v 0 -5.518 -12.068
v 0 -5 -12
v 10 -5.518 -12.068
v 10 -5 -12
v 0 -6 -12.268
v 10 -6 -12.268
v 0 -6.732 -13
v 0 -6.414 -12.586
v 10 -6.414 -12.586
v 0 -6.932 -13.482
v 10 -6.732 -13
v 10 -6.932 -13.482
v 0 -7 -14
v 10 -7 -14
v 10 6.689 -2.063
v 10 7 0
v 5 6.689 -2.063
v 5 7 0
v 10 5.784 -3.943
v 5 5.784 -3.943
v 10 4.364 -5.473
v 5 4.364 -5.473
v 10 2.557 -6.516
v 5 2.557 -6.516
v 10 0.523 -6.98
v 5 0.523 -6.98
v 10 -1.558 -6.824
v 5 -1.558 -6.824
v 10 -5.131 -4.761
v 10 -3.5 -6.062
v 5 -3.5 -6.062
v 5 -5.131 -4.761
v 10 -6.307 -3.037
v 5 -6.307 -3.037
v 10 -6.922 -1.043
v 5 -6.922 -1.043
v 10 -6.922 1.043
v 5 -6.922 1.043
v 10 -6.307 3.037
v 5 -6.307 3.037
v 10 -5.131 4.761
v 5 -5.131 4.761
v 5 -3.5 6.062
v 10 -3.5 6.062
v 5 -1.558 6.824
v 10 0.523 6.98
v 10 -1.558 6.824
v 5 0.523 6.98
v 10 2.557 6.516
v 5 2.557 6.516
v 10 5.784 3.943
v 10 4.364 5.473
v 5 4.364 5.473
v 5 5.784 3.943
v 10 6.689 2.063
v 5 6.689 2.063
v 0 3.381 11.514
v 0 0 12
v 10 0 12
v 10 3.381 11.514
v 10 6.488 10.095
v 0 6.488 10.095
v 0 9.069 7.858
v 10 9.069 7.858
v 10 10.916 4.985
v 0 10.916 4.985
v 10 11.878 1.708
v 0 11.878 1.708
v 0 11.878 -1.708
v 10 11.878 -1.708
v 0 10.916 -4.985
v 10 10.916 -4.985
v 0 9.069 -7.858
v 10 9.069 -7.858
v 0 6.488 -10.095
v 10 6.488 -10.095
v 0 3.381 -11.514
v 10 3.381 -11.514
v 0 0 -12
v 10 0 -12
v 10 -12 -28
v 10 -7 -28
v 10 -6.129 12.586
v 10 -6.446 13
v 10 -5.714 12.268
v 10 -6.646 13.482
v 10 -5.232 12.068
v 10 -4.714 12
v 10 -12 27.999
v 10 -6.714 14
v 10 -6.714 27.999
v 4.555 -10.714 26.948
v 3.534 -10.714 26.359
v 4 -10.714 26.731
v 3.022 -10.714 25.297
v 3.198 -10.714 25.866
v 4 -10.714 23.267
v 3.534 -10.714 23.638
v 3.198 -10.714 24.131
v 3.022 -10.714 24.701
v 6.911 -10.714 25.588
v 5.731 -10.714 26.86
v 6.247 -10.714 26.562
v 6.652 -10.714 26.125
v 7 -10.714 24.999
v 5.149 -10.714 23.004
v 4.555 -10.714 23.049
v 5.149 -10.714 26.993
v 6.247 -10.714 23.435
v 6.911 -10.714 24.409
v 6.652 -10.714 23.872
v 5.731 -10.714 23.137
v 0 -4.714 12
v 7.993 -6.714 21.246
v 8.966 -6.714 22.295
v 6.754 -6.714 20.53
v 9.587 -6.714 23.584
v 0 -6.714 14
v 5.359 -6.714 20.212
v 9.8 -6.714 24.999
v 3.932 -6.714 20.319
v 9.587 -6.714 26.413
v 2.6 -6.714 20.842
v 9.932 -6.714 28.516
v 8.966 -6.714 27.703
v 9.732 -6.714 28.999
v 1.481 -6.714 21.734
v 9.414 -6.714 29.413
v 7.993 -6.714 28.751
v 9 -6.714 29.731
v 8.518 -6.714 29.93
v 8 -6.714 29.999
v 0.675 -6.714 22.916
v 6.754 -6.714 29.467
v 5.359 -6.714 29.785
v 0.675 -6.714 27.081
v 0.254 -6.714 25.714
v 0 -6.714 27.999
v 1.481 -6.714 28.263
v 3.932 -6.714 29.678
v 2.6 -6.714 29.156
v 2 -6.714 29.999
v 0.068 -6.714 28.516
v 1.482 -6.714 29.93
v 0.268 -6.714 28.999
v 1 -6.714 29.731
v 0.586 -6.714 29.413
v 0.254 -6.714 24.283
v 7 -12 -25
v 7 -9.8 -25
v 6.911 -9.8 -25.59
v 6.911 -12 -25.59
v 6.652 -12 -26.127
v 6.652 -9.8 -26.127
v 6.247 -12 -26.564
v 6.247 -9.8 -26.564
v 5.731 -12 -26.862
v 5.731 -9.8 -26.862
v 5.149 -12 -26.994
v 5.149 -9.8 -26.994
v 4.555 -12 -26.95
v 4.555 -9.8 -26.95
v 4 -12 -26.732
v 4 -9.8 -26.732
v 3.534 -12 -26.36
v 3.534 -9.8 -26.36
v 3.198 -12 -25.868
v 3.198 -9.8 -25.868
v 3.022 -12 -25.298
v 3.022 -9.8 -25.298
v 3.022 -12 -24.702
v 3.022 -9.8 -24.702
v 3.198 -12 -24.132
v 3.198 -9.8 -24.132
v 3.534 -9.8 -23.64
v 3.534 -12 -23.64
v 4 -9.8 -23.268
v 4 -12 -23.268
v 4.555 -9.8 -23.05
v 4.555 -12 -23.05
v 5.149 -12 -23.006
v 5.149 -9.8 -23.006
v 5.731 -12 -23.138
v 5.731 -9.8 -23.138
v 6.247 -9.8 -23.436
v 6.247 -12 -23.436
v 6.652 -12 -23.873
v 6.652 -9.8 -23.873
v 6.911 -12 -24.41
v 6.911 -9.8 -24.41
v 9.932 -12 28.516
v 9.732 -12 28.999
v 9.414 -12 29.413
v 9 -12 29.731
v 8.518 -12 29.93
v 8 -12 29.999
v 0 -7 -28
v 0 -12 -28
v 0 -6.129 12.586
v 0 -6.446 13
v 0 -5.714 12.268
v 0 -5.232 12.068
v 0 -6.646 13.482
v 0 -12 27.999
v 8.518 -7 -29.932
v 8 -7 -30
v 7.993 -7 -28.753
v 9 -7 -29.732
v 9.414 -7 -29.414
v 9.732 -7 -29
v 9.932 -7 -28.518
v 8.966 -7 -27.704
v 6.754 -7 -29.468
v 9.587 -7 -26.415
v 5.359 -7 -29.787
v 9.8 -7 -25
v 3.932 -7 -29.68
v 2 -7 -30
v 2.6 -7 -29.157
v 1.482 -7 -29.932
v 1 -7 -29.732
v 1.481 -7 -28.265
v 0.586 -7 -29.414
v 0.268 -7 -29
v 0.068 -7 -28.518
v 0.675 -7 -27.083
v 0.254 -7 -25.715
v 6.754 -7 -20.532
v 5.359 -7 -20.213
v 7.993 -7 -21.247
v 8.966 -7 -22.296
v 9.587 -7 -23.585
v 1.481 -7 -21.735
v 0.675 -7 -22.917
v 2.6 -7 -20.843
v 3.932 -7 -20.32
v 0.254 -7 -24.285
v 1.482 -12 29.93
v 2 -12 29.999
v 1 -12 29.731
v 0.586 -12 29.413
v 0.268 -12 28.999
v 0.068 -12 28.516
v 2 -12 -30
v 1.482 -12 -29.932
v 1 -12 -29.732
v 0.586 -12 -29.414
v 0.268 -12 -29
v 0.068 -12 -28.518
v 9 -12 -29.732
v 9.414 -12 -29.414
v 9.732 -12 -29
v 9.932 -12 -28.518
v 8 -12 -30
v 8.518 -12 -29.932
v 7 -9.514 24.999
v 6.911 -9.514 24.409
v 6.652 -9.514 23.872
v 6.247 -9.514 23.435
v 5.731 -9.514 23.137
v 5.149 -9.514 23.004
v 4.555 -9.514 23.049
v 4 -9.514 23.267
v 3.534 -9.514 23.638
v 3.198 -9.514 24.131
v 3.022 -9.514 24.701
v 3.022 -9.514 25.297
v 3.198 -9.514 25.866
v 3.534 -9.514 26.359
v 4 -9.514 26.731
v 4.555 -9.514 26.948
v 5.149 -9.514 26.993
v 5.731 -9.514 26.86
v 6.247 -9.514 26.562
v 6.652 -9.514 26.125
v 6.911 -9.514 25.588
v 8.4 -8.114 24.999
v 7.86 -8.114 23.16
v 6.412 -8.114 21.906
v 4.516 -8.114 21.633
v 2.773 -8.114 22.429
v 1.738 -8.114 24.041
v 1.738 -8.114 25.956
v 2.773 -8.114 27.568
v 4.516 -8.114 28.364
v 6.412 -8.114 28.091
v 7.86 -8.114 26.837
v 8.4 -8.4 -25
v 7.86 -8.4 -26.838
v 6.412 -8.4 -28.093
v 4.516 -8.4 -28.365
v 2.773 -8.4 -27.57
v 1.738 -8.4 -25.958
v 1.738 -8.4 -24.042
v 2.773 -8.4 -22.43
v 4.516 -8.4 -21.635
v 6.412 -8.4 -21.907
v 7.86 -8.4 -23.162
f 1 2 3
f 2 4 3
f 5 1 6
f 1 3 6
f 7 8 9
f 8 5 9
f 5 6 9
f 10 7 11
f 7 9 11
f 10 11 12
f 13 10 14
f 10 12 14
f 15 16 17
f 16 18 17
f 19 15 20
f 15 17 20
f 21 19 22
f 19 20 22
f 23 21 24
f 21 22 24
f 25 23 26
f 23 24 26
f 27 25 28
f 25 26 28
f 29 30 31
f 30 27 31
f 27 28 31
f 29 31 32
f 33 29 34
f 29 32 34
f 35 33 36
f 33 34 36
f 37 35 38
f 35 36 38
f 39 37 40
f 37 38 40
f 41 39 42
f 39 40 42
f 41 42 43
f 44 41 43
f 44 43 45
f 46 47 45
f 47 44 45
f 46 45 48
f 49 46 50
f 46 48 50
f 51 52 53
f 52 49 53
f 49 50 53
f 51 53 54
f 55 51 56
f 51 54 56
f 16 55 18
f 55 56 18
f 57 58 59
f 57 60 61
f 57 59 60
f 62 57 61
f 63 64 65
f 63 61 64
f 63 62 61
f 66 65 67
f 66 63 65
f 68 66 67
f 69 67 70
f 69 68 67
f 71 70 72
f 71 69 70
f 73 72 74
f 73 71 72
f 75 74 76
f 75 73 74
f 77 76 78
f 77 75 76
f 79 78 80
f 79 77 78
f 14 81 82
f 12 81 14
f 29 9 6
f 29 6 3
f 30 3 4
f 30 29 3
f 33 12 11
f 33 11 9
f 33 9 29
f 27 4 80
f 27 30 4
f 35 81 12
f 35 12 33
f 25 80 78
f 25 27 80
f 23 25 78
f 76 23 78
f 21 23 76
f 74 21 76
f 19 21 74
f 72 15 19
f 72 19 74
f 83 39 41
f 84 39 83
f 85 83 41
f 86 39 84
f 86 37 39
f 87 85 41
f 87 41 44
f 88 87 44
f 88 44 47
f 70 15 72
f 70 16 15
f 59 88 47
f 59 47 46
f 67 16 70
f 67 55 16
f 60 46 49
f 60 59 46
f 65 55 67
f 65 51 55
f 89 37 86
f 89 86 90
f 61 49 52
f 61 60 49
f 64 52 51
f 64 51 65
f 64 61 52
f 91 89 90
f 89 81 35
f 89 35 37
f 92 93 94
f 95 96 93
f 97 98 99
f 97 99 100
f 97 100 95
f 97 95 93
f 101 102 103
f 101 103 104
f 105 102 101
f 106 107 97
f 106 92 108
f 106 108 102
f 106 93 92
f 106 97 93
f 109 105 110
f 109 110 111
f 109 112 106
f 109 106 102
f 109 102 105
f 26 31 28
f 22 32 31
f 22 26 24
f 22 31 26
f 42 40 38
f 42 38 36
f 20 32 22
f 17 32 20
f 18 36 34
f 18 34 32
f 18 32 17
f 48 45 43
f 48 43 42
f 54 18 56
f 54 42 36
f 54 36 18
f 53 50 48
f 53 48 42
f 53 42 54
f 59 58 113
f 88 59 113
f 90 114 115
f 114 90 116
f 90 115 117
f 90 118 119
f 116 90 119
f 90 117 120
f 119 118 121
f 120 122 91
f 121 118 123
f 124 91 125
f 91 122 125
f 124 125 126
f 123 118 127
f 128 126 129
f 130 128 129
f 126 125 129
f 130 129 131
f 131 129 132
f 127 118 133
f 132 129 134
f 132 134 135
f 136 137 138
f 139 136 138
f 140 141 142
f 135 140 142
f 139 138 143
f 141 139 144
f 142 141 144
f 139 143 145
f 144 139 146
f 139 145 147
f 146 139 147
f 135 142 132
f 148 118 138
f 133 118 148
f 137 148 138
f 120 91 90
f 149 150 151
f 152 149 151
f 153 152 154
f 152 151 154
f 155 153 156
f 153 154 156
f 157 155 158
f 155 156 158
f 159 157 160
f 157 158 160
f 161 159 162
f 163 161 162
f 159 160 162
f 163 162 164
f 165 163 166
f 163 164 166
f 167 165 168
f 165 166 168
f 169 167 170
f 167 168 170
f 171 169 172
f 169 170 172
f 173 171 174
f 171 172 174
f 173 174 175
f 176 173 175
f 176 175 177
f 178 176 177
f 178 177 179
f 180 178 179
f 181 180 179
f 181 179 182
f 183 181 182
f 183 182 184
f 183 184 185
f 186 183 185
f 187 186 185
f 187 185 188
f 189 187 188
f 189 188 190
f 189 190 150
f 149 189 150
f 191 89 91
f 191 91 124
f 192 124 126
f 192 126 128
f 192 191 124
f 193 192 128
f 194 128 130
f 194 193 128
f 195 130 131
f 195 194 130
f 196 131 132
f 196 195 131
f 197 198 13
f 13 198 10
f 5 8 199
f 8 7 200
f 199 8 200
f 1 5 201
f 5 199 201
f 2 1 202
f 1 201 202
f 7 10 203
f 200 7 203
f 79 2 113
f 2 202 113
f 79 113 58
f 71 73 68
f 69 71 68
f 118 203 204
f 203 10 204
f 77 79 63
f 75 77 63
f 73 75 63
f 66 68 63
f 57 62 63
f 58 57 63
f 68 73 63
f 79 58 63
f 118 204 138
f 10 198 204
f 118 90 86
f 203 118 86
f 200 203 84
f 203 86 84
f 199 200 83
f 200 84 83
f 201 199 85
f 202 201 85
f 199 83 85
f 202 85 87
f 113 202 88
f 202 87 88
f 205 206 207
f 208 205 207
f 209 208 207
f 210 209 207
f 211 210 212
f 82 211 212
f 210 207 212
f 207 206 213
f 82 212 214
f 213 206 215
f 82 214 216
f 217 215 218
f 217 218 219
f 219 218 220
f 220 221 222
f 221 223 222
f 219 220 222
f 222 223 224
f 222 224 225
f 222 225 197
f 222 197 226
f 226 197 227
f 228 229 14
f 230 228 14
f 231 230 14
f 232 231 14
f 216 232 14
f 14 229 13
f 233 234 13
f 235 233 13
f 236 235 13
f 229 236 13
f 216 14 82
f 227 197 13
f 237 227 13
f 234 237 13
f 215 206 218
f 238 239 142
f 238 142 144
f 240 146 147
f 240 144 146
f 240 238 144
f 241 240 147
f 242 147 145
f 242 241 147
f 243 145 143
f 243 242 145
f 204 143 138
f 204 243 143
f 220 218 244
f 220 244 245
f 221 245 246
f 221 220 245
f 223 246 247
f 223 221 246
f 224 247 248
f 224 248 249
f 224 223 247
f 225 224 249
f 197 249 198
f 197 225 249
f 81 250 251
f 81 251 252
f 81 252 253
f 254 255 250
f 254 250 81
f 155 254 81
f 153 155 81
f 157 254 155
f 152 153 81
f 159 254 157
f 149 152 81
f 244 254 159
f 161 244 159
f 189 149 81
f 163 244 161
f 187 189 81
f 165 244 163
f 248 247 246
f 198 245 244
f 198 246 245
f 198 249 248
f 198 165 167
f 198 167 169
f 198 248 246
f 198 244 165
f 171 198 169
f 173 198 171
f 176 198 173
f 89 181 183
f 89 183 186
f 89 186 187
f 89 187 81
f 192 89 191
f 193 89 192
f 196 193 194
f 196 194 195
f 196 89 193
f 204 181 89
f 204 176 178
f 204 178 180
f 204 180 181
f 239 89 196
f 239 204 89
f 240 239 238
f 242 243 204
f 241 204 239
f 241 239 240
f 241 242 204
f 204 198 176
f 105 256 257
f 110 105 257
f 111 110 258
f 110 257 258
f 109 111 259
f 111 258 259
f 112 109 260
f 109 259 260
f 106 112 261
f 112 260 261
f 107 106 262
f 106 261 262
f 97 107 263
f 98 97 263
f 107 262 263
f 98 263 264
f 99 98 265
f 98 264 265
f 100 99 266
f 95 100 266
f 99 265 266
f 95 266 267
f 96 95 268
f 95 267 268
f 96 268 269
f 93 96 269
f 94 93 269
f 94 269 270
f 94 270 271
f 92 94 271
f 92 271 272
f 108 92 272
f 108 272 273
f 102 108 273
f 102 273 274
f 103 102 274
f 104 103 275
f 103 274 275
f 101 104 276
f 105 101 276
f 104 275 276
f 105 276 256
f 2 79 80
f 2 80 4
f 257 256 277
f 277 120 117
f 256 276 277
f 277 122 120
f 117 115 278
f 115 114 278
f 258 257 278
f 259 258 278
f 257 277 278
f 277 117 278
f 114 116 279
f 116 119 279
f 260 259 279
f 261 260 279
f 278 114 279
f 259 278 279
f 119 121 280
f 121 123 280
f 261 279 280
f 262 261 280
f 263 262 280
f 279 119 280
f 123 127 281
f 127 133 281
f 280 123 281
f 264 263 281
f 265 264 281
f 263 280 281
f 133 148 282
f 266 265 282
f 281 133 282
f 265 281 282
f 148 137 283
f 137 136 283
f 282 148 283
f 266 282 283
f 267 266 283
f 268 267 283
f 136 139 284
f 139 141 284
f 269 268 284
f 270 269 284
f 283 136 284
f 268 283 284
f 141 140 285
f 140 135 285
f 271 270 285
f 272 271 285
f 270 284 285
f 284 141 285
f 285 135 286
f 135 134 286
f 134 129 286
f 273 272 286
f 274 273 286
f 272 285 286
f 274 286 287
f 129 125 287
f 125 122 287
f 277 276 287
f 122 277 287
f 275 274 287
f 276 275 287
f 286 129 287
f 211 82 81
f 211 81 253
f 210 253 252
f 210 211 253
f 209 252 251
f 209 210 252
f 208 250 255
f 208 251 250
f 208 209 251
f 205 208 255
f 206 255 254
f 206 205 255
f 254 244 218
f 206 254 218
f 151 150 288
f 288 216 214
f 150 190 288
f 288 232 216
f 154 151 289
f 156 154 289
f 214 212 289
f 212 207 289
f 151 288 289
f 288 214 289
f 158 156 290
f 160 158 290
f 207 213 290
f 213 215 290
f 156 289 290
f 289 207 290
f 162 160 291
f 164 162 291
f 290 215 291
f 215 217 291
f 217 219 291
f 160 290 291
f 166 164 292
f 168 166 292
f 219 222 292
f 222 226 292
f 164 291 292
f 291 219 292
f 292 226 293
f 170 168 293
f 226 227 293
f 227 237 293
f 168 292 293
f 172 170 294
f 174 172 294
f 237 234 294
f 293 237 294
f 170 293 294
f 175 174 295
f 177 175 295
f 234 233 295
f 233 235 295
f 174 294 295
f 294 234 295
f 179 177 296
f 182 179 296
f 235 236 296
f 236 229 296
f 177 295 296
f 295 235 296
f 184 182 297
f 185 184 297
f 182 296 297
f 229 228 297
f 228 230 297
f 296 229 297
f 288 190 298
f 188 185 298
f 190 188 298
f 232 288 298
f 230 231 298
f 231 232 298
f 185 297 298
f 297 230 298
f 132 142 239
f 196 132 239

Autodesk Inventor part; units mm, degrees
ref_plane "YZ Plane" through (0, 0, 0) normal (1, 0, 0) x (0, 1, 0)
ref_plane "XZ Plane" through (0, 0, 0) normal (0, 1, 0) x (-1, 0, 0)
ref_plane "XY Plane" through (0, 0, 0) normal (0, 0, 1) x (1, 0, 0)
sketch "Sketch1" plane through (0, 0, 0) normal (1, 0, 0) x (0, 1, 0)
  circle A0 centre (0, 0) radius 7
  arc A1 (0, -12) -> (0, 12) centre (0, 0) ccw
  circle A2 centre (0, 0) radius 2.475
  line L0 (-12, -30) -> (-12, 29.9986)
  line L1 (-6.7144, 29.9986) -> (-12, 29.9986)
  line L2 (-12, -30) -> (-7, -30)
  line L3 (-7, -30) -> (-7, -12)
  line L4 (0, -12) -> (-7, -12)
  line L5 (0, 12) -> (-6.7144, 12)
  line L6 (-6.7144, 12) -> (-6.7144, 29.9986)
  point P0 (-7, 0)
  dimension "d0" = 14
  dimension "d1" = 30
  dimension "d2" = 30
  dimension "d4" = 5
  dimension "d5" = 4.95
  dimension "d22" = 5
extrude "Extrusion1" add sketch "Sketch1" along normal blind 5 contours A0 | A2
extrude "Extrusion2" add sketch "Sketch1" along normal blind 10 contours L4 L3 L2 L0 L1 L6 L5 A1
sketch "Sketch3" plane through (0, -7, -12) normal (0, 1, 0) x (1, 0, 0)
  circle A0 centre (5, 13) radius 2
  line L0 (0, 18) -> (10, 18) projected
  point P0 (0, -12)
  point P1 (5, 18)
  dimension "d26" = 4
  dimension "d27" = 0
  dimension "d28" = 5
extrude "Extrusion4" cut sketch "Sketch3" against normal blind 10
chamfer "Chamfer4" distance 2.8 angle 45 1 edges at (3, -7, -25)
fillet "Fillet2" radius 2 2 edges at (10, -9.5, -30) (0, -9.5, -30)
sketch "Sketch4" plane through (0, -6.7144, 29.9986) normal (0, 1, 0) x (1, 0, 0)
  circle A0 centre (5, 5) radius 2
  line L0 (0, 0) -> (10, 0) projected
  point P0 (0, 29.9986)
  point P1 (5, 0)
  dimension "d35" = 4
  dimension "d36" = 0
  dimension "d37" = 5
extrude "Extrusion5" cut sketch "Sketch4" against normal blind 4
chamfer "Chamfer5" distance 2.8 angle 45 1 edges at (3, -6.7144, 24.9986)
fillet "Fillet3" radius 2 4 edges at (0, -9.3572, 29.9986) (10, -9.3572, 29.9986) (5, -6.7144, 12) (5, -7, -12)
equation "\"d38\" = d35"
properties part number "bearing_holder"
